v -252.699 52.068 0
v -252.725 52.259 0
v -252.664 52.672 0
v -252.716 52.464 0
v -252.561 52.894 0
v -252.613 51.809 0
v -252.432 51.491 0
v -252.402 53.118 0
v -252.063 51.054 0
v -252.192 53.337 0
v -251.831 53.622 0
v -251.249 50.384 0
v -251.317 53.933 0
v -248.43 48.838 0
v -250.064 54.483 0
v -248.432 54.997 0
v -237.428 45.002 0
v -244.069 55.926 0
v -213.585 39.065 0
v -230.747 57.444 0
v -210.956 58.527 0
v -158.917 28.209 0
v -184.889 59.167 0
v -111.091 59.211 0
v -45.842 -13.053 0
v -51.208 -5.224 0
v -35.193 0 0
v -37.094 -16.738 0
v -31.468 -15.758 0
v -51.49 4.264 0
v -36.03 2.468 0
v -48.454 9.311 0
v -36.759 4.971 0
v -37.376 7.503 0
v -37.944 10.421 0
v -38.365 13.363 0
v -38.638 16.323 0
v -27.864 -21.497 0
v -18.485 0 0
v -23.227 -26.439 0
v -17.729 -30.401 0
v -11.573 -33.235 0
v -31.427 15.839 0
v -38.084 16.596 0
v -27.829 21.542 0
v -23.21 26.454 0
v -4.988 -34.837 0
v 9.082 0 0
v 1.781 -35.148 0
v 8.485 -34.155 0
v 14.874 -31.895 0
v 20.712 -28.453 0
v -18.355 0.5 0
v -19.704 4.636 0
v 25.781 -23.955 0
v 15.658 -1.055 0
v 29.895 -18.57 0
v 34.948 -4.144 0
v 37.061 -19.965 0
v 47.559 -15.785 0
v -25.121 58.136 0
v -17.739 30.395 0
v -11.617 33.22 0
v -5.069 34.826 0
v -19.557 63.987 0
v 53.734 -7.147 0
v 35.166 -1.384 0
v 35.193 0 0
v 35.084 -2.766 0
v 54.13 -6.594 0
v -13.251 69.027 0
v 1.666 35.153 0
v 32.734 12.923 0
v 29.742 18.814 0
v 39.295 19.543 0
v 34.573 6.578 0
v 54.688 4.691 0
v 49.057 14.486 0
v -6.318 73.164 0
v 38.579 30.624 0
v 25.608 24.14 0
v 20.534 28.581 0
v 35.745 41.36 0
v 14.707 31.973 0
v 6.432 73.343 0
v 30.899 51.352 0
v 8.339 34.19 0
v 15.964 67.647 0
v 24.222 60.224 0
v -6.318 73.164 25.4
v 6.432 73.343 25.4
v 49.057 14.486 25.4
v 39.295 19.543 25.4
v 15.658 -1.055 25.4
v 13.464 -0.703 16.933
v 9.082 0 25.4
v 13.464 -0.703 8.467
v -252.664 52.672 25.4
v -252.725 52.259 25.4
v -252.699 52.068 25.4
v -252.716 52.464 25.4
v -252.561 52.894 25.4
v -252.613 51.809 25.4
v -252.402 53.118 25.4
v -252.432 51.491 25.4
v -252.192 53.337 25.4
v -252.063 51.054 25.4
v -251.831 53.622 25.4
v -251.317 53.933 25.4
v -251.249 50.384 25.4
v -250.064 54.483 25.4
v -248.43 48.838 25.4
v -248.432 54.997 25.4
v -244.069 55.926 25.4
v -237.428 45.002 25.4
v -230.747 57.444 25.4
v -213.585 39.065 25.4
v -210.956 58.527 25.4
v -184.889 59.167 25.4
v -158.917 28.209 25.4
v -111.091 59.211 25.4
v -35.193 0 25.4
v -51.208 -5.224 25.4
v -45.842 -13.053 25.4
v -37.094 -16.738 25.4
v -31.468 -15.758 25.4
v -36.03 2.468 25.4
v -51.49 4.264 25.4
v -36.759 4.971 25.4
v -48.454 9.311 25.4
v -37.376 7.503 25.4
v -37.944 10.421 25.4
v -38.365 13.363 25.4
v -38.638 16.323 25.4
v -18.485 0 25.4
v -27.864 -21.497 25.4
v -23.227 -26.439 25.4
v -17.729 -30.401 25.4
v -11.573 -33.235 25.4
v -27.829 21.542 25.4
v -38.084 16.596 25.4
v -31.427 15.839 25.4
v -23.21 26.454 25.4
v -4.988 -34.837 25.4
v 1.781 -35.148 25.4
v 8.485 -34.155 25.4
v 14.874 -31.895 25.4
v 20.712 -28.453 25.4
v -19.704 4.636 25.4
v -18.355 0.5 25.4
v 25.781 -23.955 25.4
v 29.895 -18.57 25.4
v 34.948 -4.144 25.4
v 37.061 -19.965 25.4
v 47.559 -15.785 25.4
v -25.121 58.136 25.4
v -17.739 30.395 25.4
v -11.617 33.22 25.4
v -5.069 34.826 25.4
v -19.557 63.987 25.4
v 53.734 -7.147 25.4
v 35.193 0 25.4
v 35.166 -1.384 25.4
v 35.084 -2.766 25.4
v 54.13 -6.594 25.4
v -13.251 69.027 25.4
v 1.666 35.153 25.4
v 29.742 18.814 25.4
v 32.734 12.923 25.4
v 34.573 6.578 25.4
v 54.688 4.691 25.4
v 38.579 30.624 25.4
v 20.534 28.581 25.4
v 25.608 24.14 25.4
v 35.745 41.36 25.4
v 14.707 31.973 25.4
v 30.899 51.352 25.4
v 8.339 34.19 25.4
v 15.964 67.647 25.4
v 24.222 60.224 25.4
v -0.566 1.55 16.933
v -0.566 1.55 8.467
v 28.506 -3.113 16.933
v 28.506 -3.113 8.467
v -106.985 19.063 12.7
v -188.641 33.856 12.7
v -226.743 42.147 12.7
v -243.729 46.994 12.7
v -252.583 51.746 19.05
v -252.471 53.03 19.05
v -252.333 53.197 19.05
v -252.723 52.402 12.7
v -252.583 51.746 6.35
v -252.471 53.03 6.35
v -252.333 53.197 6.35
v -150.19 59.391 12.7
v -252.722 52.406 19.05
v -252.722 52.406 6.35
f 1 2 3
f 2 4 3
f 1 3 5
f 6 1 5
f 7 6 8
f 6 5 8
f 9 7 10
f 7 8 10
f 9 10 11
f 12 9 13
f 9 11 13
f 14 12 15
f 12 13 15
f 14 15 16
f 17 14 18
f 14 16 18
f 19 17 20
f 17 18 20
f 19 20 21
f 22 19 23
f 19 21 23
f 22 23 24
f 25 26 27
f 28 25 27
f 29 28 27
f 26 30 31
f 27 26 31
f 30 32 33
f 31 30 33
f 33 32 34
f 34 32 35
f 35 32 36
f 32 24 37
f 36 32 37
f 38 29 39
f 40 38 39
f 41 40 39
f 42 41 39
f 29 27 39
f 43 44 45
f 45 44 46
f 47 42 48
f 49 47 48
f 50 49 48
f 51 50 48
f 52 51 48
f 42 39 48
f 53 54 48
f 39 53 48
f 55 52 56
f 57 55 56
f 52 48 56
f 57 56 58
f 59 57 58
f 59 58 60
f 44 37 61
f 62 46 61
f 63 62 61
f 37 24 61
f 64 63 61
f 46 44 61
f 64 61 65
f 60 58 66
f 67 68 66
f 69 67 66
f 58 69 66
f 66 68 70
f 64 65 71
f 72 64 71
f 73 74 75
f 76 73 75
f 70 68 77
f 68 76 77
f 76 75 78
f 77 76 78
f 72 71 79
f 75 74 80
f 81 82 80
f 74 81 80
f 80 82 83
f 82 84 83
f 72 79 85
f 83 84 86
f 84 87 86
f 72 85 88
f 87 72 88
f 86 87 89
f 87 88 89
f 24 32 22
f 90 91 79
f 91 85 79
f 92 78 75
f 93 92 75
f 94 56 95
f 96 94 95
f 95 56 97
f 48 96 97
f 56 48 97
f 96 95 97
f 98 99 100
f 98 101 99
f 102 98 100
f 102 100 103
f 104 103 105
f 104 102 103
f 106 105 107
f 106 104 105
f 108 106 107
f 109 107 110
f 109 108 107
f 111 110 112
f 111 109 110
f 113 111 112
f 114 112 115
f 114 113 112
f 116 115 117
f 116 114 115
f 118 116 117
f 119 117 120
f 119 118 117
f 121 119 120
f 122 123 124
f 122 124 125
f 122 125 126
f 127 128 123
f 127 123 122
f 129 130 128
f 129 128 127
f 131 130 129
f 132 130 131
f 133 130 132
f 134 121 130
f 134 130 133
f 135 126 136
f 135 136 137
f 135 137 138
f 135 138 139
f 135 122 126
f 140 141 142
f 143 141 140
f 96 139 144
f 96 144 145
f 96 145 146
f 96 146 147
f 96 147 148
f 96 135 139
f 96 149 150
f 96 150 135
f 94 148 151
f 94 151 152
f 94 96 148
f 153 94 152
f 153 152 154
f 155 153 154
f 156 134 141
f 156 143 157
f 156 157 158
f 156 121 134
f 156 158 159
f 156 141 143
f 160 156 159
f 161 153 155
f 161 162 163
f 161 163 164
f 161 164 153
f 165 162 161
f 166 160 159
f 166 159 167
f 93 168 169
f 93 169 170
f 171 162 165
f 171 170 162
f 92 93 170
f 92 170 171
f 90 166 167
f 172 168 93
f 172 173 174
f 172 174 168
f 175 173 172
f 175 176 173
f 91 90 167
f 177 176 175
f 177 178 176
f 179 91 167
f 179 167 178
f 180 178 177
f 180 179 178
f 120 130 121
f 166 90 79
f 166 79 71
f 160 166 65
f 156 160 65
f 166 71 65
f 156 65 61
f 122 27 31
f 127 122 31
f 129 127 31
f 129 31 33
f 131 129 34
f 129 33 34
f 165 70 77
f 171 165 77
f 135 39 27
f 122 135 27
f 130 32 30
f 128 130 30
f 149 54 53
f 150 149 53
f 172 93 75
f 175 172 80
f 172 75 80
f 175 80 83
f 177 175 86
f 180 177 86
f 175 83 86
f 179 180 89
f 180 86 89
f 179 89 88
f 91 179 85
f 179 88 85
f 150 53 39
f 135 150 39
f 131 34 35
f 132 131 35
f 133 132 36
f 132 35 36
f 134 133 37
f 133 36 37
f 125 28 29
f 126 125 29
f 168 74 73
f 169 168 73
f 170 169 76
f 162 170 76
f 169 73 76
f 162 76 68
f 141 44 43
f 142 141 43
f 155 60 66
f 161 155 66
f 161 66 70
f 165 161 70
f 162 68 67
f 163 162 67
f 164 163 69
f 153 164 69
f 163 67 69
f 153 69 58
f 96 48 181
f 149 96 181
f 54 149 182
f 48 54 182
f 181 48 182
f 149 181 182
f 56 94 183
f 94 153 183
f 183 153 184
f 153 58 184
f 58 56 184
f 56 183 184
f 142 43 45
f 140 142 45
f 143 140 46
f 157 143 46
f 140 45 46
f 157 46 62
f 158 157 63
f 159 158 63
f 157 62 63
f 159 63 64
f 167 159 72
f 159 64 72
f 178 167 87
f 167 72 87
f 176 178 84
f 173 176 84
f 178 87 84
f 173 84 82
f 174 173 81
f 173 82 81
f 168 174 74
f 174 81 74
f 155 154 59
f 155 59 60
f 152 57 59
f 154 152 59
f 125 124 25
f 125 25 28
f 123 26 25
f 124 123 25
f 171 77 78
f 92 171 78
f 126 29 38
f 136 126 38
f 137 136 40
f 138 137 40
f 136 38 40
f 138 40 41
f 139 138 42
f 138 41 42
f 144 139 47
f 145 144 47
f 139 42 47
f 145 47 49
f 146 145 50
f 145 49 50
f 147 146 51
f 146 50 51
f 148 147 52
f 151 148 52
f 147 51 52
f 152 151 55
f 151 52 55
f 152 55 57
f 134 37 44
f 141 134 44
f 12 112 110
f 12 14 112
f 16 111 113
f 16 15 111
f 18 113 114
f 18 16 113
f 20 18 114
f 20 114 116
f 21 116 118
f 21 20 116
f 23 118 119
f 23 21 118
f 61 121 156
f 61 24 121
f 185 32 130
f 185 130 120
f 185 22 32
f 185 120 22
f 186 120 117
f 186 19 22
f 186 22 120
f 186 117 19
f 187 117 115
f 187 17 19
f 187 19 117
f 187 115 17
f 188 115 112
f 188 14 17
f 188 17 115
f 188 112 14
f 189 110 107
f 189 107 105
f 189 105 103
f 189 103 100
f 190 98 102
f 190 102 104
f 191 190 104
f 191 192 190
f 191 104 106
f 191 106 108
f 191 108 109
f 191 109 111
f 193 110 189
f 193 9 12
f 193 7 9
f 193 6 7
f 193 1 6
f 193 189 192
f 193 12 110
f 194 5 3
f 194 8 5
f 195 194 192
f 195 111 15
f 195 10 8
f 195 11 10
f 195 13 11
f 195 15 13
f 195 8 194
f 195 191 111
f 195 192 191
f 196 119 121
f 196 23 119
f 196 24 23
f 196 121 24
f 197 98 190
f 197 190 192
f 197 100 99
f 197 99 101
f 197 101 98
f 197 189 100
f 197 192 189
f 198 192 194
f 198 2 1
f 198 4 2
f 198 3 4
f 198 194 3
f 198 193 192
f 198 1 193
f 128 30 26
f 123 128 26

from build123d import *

# Parameters (mm, degrees)
F1_DEPTH    = 25.4
F2_DEPTH    = 25.4
F3_T1_DEPTH = 60.9890887747


# Not quite as in the source:
# - a fillet or chamfer that OpenCascade refuses, or shapes differently, is made with other operations: its cross-section is extruded or revolved along the edge and cut away or added


with BuildPart() as f1:
    # F0 (on Top) → F1 (new body)
    with BuildSketch(Plane.XY):
        with BuildLine():
            Line((0, 0), (9.0822612578, 0))
            add(Edge.make_bspline(
                [(9.0822612578, 0), (-0.5887823283, 1.5524321895), (-10.1972217153, 3.0991138841), (-19.7038336111, 4.636442237)],
                knots=[0.053890232, 0.053890232, 0.053890232, 0.053890232, 0.0876539783, 0.0876539783, 0.0876539783, 0.0876539783], degree=3))
            Line((-19.7038336111, 4.636442237), (-18.3546670651, 0.4999203421))
            Line((-18.3546670651, 0.4999203421), (-18.4854740521, 0))
            Line((-18.4854740521, 0), (0, 0))
        make_face()
    extrude(amount=F1_DEPTH)

    # F0 (on Top) → F2 (join)
    with BuildSketch(Plane.XY):
        with BuildLine():
            ThreePointArc((39.2946183394, 19.5425995517), (38.0990536847, 9.5917687024), (35.1927875929, 0))
            ThreePointArc((35.1927875929, 0), (35.1315324061, -2.0755070121), (34.9479800825, -4.1437889318))
            add(Edge.make_bspline(
                [(53.7340444048, -7.1471543317), (47.4674866948, -6.1456158537), (41.202016032, -5.1441772263), (34.9479800825, -4.1437889318)],
                knots=[0.0022748674, 0.0022748674, 0.0022748674, 0.0022748674, 0.0239294634, 0.0239294634, 0.0239294634, 0.0239294634], degree=3))
            Line((53.7340444048, -7.1471543317), (54.1296049181, -6.5938649088))
            Line((54.1296049181, -6.5938649088), (54.6883645828, 4.6909042491))
            Line((54.6883645828, 4.6909042491), (49.0574163024, 14.4863444523))
            Line((49.0574163024, 14.4863444523), (39.2946183394, 19.5425995517))
        make_face()
        with BuildLine():
            ThreePointArc((29.7418780254, 18.8136384064), (33.8026026699, 9.793689361), (35.1927875929, 0))
            ThreePointArc((35.1927875929, 0), (38.0990536847, 9.5917687024), (39.2946183394, 19.5425995517))
            Line((39.2946183394, 19.5425995517), (39.0245463695, 19.6824726475))
            Line((39.0245463695, 19.6824726475), (29.7418780254, 18.8136384064))
        make_face()
        with BuildLine():
            ThreePointArc((-31.426870984, 15.839320652), (-1.7092225846, 35.1512568298), (29.7418780254, 18.8136384064))
            Line((29.7418780254, 18.8136384064), (39.0245463695, 19.6824726475))
            Line((39.0245463695, 19.6824726475), (39.2946183394, 19.5425995517))
            ThreePointArc((39.2946183394, 19.5425995517), (29.0039385515, 54.2539705519), (0, 75.9230479598))
            ThreePointArc((0, 75.9230479598), (-13.7345779986, 68.6878764709), (-25.1210674885, 58.1363743803))
            ThreePointArc((-25.1210674885, 58.1363743803), (-35.8950760367, 38.527599561), (-38.637588859, 16.3226016208))
            Line((-38.637588859, 16.3226016208), (-38.0839338665, 16.5955866568))
            Line((-38.0839338665, 16.5955866568), (-31.426870984, 15.839320652))
        make_face()
        with BuildLine():
            add(Edge.make_bspline(
                [(53.7340444048, -7.1471543317), (47.4674866948, -6.1456158537), (41.202016032, -5.1441772263), (34.9479800825, -4.1437889318)],
                knots=[0.0022748674, 0.0022748674, 0.0022748674, 0.0022748674, 0.0239294634, 0.0239294634, 0.0239294634, 0.0239294634], degree=3))
            ThreePointArc((34.9479800825, -4.1437889318), (33.2140769684, -11.6343194773), (29.8948841627, -18.56955033))
            Line((29.8948841627, -18.56955033), (37.0614353142, -19.964725406))
            Line((37.0614353142, -19.964725406), (47.5585395538, -15.7851285483))
            Line((47.5585395538, -15.7851285483), (53.7340444048, -7.1471543317))
        make_face()
        with BuildLine():
            ThreePointArc((29.8948841627, -18.56955033), (33.2140769684, -11.6343194773), (34.9479800825, -4.1437889318))
            add(Edge.make_bspline(
                [(34.9479800825, -4.1437889318), (28.5019841788, -3.1126949471), (22.0681357101, -2.0827167623), (15.6577647144, -1.0548950957)],
                knots=[0.0239294634, 0.0239294634, 0.0239294634, 0.0239294634, 0.0462487206, 0.0462487206, 0.0462487206, 0.0462487206], degree=3))
            Line((15.6577647144, -1.0548950956), (17.8084989026, -9.9934284194))
            Line((17.8084989026, -9.9934284194), (25.9710486263, -17.8056630113))
            Line((25.9710486263, -17.8056630113), (29.8948841627, -18.56955033))
        make_face()
        with BuildLine():
            ThreePointArc((-31.4678779331, -15.7576951661), (-1.6109654608, -35.1558969285), (29.8948841627, -18.56955033))
            Line((29.8948841627, -18.56955033), (25.9710486263, -17.8056630113))
            Line((25.9710486263, -17.8056630113), (17.8084989026, -9.9934284194))
            Line((17.8084989026, -9.9934284194), (15.6577647144, -1.0548950956))
            add(Edge.make_bspline(
                [(15.6577647144, -1.0548950957), (13.4630266479, -0.7029966893), (11.271040594, -0.3513510685), (9.0822612578, 0)],
                knots=[0.0462487206, 0.0462487206, 0.0462487206, 0.0462487206, 0.053890232, 0.053890232, 0.053890232, 0.053890232], degree=3))
            Line((9.0822612578, 0), (0, 0))
            Line((0, 0), (-18.4854740521, 0))
            Line((-18.4854740521, 0), (-20.7573818702, -8.6828154927))
            Line((-20.7573818702, -8.6828154927), (-27.7432359966, -15.1088187584))
            Line((-27.7432359966, -15.1088187584), (-31.4678779331, -15.7576951661))
        make_face()
        with BuildLine():
            Line((-37.0942701188, -16.7378788221), (-31.4678779331, -15.7576951661))
            ThreePointArc((-31.4678779331, -15.7576951661), (-34.2489024836, -8.0959852539), (-35.1927875929, 0))
            ThreePointArc((-35.1927875929, 0), (-36.4082086965, 3.7156215634), (-37.3761939959, 7.5032456896))
            add(Edge.make_bspline(
                [(-37.3761939959, 7.5032456896), (-41.0895221285, 8.1076779871), (-44.782988486, 8.7102858856), (-48.4541472769, 9.3108447276)],
                knots=[0.1087279171, 0.1087279171, 0.1087279171, 0.1087279171, 0.1221167407, 0.1221167407, 0.1221167407, 0.1221167407], degree=3))
            Line((-48.4541472769, 9.3108447276), (-51.4896897645, 4.2641766931))
            Line((-51.4896897645, 4.2641766931), (-51.2080020921, -5.2235168043))
            Line((-51.2080020921, -5.2235168043), (-45.8415969743, -13.052780624))
            Line((-45.8415969743, -13.052780624), (-37.0942701188, -16.7378788221))
        make_face()
        with BuildLine():
            ThreePointArc((-35.1927875929, 0), (-34.2489024836, -8.0959852539), (-31.4678779331, -15.7576951661))
            Line((-31.4678779331, -15.7576951661), (-27.7432359966, -15.1088187584))
            Line((-27.7432359966, -15.1088187584), (-20.7573818702, -8.6828154927))
            Line((-20.7573818702, -8.6828154927), (-18.4854740521, 0))
            Line((-18.4854740521, 0), (-35.1927875929, 0))
        make_face()
        with BuildLine():
            ThreePointArc((-38.637588859, 16.3226016208), (-35.8950760367, 38.527599561), (-25.1210674885, 58.1363743803))
            add(Edge.make_bspline(
                [(-48.4541472769, 9.3108447276), (-161.5048500043, 27.8046236609), (-354.0298848729, 62.4785632102), (-140.2321873005, 59.829817618), (-25.1210674885, 58.1363743803)],
                knots=[0.1221167407, 0.1221167407, 0.1221167407, 0.1221167407, 0.5344159633, 0.9858900342, 0.9858900342, 0.9858900342, 0.9858900342], degree=3))
            Line((-48.4541472769, 9.3108447276), (-46.5972261458, 12.3980242197))
            Line((-46.5972261458, 12.3980242197), (-38.637588859, 16.3226016208))
        make_face()
        with BuildLine():
            add(Edge.make_bspline(
                [(-37.3761939959, 7.5032456896), (-41.0895221285, 8.1076779871), (-44.782988486, 8.7102858856), (-48.4541472769, 9.3108447276)],
                knots=[0.1087279171, 0.1087279171, 0.1087279171, 0.1087279171, 0.1221167407, 0.1221167407, 0.1221167407, 0.1221167407], degree=3))
            ThreePointArc((-37.3761939959, 7.5032456896), (-38.172734201, 11.8892038706), (-38.637588859, 16.3226016208))
            Line((-38.637588859, 16.3226016208), (-46.5972261458, 12.3980242197))
            Line((-46.5972261458, 12.3980242197), (-48.4541472769, 9.3108447276))
        make_face()
    extrude(amount=F2_DEPTH)

    # F3: chamfer of 5.08 on 1 edges, made by hand

    # F3_s2 → F3_t1 (cut)
    with BuildSketch(Plane.XY.offset(-17.7945443873)):
        with BuildLine():
            Line((6.6348201683, 73.3457449263), (-6.5209439135, 73.161183328))
            Line((-6.5209439135, 73.161183328), (-6.5669480575, 73.2517712893))
            ThreePointArc((-6.5669480575, 73.2517712893), (-3.3257137482, 74.6908686941), (-0.0351808653, 76.018362527))
            Line((-0.0351808653, 76.018362527), (0.0320735811, 76.019452552))
            ThreePointArc((0.0320735811, 76.019452552), (3.3798158566, 74.7892252054), (6.6782649991, 73.4375877631))
            Line((6.6782649991, 73.4375877631), (6.6348201683, 73.3457449263))
        make_face()
    extrude(amount=F3_T1_DEPTH, mode=Mode.SUBTRACT)


solid = f1.part
